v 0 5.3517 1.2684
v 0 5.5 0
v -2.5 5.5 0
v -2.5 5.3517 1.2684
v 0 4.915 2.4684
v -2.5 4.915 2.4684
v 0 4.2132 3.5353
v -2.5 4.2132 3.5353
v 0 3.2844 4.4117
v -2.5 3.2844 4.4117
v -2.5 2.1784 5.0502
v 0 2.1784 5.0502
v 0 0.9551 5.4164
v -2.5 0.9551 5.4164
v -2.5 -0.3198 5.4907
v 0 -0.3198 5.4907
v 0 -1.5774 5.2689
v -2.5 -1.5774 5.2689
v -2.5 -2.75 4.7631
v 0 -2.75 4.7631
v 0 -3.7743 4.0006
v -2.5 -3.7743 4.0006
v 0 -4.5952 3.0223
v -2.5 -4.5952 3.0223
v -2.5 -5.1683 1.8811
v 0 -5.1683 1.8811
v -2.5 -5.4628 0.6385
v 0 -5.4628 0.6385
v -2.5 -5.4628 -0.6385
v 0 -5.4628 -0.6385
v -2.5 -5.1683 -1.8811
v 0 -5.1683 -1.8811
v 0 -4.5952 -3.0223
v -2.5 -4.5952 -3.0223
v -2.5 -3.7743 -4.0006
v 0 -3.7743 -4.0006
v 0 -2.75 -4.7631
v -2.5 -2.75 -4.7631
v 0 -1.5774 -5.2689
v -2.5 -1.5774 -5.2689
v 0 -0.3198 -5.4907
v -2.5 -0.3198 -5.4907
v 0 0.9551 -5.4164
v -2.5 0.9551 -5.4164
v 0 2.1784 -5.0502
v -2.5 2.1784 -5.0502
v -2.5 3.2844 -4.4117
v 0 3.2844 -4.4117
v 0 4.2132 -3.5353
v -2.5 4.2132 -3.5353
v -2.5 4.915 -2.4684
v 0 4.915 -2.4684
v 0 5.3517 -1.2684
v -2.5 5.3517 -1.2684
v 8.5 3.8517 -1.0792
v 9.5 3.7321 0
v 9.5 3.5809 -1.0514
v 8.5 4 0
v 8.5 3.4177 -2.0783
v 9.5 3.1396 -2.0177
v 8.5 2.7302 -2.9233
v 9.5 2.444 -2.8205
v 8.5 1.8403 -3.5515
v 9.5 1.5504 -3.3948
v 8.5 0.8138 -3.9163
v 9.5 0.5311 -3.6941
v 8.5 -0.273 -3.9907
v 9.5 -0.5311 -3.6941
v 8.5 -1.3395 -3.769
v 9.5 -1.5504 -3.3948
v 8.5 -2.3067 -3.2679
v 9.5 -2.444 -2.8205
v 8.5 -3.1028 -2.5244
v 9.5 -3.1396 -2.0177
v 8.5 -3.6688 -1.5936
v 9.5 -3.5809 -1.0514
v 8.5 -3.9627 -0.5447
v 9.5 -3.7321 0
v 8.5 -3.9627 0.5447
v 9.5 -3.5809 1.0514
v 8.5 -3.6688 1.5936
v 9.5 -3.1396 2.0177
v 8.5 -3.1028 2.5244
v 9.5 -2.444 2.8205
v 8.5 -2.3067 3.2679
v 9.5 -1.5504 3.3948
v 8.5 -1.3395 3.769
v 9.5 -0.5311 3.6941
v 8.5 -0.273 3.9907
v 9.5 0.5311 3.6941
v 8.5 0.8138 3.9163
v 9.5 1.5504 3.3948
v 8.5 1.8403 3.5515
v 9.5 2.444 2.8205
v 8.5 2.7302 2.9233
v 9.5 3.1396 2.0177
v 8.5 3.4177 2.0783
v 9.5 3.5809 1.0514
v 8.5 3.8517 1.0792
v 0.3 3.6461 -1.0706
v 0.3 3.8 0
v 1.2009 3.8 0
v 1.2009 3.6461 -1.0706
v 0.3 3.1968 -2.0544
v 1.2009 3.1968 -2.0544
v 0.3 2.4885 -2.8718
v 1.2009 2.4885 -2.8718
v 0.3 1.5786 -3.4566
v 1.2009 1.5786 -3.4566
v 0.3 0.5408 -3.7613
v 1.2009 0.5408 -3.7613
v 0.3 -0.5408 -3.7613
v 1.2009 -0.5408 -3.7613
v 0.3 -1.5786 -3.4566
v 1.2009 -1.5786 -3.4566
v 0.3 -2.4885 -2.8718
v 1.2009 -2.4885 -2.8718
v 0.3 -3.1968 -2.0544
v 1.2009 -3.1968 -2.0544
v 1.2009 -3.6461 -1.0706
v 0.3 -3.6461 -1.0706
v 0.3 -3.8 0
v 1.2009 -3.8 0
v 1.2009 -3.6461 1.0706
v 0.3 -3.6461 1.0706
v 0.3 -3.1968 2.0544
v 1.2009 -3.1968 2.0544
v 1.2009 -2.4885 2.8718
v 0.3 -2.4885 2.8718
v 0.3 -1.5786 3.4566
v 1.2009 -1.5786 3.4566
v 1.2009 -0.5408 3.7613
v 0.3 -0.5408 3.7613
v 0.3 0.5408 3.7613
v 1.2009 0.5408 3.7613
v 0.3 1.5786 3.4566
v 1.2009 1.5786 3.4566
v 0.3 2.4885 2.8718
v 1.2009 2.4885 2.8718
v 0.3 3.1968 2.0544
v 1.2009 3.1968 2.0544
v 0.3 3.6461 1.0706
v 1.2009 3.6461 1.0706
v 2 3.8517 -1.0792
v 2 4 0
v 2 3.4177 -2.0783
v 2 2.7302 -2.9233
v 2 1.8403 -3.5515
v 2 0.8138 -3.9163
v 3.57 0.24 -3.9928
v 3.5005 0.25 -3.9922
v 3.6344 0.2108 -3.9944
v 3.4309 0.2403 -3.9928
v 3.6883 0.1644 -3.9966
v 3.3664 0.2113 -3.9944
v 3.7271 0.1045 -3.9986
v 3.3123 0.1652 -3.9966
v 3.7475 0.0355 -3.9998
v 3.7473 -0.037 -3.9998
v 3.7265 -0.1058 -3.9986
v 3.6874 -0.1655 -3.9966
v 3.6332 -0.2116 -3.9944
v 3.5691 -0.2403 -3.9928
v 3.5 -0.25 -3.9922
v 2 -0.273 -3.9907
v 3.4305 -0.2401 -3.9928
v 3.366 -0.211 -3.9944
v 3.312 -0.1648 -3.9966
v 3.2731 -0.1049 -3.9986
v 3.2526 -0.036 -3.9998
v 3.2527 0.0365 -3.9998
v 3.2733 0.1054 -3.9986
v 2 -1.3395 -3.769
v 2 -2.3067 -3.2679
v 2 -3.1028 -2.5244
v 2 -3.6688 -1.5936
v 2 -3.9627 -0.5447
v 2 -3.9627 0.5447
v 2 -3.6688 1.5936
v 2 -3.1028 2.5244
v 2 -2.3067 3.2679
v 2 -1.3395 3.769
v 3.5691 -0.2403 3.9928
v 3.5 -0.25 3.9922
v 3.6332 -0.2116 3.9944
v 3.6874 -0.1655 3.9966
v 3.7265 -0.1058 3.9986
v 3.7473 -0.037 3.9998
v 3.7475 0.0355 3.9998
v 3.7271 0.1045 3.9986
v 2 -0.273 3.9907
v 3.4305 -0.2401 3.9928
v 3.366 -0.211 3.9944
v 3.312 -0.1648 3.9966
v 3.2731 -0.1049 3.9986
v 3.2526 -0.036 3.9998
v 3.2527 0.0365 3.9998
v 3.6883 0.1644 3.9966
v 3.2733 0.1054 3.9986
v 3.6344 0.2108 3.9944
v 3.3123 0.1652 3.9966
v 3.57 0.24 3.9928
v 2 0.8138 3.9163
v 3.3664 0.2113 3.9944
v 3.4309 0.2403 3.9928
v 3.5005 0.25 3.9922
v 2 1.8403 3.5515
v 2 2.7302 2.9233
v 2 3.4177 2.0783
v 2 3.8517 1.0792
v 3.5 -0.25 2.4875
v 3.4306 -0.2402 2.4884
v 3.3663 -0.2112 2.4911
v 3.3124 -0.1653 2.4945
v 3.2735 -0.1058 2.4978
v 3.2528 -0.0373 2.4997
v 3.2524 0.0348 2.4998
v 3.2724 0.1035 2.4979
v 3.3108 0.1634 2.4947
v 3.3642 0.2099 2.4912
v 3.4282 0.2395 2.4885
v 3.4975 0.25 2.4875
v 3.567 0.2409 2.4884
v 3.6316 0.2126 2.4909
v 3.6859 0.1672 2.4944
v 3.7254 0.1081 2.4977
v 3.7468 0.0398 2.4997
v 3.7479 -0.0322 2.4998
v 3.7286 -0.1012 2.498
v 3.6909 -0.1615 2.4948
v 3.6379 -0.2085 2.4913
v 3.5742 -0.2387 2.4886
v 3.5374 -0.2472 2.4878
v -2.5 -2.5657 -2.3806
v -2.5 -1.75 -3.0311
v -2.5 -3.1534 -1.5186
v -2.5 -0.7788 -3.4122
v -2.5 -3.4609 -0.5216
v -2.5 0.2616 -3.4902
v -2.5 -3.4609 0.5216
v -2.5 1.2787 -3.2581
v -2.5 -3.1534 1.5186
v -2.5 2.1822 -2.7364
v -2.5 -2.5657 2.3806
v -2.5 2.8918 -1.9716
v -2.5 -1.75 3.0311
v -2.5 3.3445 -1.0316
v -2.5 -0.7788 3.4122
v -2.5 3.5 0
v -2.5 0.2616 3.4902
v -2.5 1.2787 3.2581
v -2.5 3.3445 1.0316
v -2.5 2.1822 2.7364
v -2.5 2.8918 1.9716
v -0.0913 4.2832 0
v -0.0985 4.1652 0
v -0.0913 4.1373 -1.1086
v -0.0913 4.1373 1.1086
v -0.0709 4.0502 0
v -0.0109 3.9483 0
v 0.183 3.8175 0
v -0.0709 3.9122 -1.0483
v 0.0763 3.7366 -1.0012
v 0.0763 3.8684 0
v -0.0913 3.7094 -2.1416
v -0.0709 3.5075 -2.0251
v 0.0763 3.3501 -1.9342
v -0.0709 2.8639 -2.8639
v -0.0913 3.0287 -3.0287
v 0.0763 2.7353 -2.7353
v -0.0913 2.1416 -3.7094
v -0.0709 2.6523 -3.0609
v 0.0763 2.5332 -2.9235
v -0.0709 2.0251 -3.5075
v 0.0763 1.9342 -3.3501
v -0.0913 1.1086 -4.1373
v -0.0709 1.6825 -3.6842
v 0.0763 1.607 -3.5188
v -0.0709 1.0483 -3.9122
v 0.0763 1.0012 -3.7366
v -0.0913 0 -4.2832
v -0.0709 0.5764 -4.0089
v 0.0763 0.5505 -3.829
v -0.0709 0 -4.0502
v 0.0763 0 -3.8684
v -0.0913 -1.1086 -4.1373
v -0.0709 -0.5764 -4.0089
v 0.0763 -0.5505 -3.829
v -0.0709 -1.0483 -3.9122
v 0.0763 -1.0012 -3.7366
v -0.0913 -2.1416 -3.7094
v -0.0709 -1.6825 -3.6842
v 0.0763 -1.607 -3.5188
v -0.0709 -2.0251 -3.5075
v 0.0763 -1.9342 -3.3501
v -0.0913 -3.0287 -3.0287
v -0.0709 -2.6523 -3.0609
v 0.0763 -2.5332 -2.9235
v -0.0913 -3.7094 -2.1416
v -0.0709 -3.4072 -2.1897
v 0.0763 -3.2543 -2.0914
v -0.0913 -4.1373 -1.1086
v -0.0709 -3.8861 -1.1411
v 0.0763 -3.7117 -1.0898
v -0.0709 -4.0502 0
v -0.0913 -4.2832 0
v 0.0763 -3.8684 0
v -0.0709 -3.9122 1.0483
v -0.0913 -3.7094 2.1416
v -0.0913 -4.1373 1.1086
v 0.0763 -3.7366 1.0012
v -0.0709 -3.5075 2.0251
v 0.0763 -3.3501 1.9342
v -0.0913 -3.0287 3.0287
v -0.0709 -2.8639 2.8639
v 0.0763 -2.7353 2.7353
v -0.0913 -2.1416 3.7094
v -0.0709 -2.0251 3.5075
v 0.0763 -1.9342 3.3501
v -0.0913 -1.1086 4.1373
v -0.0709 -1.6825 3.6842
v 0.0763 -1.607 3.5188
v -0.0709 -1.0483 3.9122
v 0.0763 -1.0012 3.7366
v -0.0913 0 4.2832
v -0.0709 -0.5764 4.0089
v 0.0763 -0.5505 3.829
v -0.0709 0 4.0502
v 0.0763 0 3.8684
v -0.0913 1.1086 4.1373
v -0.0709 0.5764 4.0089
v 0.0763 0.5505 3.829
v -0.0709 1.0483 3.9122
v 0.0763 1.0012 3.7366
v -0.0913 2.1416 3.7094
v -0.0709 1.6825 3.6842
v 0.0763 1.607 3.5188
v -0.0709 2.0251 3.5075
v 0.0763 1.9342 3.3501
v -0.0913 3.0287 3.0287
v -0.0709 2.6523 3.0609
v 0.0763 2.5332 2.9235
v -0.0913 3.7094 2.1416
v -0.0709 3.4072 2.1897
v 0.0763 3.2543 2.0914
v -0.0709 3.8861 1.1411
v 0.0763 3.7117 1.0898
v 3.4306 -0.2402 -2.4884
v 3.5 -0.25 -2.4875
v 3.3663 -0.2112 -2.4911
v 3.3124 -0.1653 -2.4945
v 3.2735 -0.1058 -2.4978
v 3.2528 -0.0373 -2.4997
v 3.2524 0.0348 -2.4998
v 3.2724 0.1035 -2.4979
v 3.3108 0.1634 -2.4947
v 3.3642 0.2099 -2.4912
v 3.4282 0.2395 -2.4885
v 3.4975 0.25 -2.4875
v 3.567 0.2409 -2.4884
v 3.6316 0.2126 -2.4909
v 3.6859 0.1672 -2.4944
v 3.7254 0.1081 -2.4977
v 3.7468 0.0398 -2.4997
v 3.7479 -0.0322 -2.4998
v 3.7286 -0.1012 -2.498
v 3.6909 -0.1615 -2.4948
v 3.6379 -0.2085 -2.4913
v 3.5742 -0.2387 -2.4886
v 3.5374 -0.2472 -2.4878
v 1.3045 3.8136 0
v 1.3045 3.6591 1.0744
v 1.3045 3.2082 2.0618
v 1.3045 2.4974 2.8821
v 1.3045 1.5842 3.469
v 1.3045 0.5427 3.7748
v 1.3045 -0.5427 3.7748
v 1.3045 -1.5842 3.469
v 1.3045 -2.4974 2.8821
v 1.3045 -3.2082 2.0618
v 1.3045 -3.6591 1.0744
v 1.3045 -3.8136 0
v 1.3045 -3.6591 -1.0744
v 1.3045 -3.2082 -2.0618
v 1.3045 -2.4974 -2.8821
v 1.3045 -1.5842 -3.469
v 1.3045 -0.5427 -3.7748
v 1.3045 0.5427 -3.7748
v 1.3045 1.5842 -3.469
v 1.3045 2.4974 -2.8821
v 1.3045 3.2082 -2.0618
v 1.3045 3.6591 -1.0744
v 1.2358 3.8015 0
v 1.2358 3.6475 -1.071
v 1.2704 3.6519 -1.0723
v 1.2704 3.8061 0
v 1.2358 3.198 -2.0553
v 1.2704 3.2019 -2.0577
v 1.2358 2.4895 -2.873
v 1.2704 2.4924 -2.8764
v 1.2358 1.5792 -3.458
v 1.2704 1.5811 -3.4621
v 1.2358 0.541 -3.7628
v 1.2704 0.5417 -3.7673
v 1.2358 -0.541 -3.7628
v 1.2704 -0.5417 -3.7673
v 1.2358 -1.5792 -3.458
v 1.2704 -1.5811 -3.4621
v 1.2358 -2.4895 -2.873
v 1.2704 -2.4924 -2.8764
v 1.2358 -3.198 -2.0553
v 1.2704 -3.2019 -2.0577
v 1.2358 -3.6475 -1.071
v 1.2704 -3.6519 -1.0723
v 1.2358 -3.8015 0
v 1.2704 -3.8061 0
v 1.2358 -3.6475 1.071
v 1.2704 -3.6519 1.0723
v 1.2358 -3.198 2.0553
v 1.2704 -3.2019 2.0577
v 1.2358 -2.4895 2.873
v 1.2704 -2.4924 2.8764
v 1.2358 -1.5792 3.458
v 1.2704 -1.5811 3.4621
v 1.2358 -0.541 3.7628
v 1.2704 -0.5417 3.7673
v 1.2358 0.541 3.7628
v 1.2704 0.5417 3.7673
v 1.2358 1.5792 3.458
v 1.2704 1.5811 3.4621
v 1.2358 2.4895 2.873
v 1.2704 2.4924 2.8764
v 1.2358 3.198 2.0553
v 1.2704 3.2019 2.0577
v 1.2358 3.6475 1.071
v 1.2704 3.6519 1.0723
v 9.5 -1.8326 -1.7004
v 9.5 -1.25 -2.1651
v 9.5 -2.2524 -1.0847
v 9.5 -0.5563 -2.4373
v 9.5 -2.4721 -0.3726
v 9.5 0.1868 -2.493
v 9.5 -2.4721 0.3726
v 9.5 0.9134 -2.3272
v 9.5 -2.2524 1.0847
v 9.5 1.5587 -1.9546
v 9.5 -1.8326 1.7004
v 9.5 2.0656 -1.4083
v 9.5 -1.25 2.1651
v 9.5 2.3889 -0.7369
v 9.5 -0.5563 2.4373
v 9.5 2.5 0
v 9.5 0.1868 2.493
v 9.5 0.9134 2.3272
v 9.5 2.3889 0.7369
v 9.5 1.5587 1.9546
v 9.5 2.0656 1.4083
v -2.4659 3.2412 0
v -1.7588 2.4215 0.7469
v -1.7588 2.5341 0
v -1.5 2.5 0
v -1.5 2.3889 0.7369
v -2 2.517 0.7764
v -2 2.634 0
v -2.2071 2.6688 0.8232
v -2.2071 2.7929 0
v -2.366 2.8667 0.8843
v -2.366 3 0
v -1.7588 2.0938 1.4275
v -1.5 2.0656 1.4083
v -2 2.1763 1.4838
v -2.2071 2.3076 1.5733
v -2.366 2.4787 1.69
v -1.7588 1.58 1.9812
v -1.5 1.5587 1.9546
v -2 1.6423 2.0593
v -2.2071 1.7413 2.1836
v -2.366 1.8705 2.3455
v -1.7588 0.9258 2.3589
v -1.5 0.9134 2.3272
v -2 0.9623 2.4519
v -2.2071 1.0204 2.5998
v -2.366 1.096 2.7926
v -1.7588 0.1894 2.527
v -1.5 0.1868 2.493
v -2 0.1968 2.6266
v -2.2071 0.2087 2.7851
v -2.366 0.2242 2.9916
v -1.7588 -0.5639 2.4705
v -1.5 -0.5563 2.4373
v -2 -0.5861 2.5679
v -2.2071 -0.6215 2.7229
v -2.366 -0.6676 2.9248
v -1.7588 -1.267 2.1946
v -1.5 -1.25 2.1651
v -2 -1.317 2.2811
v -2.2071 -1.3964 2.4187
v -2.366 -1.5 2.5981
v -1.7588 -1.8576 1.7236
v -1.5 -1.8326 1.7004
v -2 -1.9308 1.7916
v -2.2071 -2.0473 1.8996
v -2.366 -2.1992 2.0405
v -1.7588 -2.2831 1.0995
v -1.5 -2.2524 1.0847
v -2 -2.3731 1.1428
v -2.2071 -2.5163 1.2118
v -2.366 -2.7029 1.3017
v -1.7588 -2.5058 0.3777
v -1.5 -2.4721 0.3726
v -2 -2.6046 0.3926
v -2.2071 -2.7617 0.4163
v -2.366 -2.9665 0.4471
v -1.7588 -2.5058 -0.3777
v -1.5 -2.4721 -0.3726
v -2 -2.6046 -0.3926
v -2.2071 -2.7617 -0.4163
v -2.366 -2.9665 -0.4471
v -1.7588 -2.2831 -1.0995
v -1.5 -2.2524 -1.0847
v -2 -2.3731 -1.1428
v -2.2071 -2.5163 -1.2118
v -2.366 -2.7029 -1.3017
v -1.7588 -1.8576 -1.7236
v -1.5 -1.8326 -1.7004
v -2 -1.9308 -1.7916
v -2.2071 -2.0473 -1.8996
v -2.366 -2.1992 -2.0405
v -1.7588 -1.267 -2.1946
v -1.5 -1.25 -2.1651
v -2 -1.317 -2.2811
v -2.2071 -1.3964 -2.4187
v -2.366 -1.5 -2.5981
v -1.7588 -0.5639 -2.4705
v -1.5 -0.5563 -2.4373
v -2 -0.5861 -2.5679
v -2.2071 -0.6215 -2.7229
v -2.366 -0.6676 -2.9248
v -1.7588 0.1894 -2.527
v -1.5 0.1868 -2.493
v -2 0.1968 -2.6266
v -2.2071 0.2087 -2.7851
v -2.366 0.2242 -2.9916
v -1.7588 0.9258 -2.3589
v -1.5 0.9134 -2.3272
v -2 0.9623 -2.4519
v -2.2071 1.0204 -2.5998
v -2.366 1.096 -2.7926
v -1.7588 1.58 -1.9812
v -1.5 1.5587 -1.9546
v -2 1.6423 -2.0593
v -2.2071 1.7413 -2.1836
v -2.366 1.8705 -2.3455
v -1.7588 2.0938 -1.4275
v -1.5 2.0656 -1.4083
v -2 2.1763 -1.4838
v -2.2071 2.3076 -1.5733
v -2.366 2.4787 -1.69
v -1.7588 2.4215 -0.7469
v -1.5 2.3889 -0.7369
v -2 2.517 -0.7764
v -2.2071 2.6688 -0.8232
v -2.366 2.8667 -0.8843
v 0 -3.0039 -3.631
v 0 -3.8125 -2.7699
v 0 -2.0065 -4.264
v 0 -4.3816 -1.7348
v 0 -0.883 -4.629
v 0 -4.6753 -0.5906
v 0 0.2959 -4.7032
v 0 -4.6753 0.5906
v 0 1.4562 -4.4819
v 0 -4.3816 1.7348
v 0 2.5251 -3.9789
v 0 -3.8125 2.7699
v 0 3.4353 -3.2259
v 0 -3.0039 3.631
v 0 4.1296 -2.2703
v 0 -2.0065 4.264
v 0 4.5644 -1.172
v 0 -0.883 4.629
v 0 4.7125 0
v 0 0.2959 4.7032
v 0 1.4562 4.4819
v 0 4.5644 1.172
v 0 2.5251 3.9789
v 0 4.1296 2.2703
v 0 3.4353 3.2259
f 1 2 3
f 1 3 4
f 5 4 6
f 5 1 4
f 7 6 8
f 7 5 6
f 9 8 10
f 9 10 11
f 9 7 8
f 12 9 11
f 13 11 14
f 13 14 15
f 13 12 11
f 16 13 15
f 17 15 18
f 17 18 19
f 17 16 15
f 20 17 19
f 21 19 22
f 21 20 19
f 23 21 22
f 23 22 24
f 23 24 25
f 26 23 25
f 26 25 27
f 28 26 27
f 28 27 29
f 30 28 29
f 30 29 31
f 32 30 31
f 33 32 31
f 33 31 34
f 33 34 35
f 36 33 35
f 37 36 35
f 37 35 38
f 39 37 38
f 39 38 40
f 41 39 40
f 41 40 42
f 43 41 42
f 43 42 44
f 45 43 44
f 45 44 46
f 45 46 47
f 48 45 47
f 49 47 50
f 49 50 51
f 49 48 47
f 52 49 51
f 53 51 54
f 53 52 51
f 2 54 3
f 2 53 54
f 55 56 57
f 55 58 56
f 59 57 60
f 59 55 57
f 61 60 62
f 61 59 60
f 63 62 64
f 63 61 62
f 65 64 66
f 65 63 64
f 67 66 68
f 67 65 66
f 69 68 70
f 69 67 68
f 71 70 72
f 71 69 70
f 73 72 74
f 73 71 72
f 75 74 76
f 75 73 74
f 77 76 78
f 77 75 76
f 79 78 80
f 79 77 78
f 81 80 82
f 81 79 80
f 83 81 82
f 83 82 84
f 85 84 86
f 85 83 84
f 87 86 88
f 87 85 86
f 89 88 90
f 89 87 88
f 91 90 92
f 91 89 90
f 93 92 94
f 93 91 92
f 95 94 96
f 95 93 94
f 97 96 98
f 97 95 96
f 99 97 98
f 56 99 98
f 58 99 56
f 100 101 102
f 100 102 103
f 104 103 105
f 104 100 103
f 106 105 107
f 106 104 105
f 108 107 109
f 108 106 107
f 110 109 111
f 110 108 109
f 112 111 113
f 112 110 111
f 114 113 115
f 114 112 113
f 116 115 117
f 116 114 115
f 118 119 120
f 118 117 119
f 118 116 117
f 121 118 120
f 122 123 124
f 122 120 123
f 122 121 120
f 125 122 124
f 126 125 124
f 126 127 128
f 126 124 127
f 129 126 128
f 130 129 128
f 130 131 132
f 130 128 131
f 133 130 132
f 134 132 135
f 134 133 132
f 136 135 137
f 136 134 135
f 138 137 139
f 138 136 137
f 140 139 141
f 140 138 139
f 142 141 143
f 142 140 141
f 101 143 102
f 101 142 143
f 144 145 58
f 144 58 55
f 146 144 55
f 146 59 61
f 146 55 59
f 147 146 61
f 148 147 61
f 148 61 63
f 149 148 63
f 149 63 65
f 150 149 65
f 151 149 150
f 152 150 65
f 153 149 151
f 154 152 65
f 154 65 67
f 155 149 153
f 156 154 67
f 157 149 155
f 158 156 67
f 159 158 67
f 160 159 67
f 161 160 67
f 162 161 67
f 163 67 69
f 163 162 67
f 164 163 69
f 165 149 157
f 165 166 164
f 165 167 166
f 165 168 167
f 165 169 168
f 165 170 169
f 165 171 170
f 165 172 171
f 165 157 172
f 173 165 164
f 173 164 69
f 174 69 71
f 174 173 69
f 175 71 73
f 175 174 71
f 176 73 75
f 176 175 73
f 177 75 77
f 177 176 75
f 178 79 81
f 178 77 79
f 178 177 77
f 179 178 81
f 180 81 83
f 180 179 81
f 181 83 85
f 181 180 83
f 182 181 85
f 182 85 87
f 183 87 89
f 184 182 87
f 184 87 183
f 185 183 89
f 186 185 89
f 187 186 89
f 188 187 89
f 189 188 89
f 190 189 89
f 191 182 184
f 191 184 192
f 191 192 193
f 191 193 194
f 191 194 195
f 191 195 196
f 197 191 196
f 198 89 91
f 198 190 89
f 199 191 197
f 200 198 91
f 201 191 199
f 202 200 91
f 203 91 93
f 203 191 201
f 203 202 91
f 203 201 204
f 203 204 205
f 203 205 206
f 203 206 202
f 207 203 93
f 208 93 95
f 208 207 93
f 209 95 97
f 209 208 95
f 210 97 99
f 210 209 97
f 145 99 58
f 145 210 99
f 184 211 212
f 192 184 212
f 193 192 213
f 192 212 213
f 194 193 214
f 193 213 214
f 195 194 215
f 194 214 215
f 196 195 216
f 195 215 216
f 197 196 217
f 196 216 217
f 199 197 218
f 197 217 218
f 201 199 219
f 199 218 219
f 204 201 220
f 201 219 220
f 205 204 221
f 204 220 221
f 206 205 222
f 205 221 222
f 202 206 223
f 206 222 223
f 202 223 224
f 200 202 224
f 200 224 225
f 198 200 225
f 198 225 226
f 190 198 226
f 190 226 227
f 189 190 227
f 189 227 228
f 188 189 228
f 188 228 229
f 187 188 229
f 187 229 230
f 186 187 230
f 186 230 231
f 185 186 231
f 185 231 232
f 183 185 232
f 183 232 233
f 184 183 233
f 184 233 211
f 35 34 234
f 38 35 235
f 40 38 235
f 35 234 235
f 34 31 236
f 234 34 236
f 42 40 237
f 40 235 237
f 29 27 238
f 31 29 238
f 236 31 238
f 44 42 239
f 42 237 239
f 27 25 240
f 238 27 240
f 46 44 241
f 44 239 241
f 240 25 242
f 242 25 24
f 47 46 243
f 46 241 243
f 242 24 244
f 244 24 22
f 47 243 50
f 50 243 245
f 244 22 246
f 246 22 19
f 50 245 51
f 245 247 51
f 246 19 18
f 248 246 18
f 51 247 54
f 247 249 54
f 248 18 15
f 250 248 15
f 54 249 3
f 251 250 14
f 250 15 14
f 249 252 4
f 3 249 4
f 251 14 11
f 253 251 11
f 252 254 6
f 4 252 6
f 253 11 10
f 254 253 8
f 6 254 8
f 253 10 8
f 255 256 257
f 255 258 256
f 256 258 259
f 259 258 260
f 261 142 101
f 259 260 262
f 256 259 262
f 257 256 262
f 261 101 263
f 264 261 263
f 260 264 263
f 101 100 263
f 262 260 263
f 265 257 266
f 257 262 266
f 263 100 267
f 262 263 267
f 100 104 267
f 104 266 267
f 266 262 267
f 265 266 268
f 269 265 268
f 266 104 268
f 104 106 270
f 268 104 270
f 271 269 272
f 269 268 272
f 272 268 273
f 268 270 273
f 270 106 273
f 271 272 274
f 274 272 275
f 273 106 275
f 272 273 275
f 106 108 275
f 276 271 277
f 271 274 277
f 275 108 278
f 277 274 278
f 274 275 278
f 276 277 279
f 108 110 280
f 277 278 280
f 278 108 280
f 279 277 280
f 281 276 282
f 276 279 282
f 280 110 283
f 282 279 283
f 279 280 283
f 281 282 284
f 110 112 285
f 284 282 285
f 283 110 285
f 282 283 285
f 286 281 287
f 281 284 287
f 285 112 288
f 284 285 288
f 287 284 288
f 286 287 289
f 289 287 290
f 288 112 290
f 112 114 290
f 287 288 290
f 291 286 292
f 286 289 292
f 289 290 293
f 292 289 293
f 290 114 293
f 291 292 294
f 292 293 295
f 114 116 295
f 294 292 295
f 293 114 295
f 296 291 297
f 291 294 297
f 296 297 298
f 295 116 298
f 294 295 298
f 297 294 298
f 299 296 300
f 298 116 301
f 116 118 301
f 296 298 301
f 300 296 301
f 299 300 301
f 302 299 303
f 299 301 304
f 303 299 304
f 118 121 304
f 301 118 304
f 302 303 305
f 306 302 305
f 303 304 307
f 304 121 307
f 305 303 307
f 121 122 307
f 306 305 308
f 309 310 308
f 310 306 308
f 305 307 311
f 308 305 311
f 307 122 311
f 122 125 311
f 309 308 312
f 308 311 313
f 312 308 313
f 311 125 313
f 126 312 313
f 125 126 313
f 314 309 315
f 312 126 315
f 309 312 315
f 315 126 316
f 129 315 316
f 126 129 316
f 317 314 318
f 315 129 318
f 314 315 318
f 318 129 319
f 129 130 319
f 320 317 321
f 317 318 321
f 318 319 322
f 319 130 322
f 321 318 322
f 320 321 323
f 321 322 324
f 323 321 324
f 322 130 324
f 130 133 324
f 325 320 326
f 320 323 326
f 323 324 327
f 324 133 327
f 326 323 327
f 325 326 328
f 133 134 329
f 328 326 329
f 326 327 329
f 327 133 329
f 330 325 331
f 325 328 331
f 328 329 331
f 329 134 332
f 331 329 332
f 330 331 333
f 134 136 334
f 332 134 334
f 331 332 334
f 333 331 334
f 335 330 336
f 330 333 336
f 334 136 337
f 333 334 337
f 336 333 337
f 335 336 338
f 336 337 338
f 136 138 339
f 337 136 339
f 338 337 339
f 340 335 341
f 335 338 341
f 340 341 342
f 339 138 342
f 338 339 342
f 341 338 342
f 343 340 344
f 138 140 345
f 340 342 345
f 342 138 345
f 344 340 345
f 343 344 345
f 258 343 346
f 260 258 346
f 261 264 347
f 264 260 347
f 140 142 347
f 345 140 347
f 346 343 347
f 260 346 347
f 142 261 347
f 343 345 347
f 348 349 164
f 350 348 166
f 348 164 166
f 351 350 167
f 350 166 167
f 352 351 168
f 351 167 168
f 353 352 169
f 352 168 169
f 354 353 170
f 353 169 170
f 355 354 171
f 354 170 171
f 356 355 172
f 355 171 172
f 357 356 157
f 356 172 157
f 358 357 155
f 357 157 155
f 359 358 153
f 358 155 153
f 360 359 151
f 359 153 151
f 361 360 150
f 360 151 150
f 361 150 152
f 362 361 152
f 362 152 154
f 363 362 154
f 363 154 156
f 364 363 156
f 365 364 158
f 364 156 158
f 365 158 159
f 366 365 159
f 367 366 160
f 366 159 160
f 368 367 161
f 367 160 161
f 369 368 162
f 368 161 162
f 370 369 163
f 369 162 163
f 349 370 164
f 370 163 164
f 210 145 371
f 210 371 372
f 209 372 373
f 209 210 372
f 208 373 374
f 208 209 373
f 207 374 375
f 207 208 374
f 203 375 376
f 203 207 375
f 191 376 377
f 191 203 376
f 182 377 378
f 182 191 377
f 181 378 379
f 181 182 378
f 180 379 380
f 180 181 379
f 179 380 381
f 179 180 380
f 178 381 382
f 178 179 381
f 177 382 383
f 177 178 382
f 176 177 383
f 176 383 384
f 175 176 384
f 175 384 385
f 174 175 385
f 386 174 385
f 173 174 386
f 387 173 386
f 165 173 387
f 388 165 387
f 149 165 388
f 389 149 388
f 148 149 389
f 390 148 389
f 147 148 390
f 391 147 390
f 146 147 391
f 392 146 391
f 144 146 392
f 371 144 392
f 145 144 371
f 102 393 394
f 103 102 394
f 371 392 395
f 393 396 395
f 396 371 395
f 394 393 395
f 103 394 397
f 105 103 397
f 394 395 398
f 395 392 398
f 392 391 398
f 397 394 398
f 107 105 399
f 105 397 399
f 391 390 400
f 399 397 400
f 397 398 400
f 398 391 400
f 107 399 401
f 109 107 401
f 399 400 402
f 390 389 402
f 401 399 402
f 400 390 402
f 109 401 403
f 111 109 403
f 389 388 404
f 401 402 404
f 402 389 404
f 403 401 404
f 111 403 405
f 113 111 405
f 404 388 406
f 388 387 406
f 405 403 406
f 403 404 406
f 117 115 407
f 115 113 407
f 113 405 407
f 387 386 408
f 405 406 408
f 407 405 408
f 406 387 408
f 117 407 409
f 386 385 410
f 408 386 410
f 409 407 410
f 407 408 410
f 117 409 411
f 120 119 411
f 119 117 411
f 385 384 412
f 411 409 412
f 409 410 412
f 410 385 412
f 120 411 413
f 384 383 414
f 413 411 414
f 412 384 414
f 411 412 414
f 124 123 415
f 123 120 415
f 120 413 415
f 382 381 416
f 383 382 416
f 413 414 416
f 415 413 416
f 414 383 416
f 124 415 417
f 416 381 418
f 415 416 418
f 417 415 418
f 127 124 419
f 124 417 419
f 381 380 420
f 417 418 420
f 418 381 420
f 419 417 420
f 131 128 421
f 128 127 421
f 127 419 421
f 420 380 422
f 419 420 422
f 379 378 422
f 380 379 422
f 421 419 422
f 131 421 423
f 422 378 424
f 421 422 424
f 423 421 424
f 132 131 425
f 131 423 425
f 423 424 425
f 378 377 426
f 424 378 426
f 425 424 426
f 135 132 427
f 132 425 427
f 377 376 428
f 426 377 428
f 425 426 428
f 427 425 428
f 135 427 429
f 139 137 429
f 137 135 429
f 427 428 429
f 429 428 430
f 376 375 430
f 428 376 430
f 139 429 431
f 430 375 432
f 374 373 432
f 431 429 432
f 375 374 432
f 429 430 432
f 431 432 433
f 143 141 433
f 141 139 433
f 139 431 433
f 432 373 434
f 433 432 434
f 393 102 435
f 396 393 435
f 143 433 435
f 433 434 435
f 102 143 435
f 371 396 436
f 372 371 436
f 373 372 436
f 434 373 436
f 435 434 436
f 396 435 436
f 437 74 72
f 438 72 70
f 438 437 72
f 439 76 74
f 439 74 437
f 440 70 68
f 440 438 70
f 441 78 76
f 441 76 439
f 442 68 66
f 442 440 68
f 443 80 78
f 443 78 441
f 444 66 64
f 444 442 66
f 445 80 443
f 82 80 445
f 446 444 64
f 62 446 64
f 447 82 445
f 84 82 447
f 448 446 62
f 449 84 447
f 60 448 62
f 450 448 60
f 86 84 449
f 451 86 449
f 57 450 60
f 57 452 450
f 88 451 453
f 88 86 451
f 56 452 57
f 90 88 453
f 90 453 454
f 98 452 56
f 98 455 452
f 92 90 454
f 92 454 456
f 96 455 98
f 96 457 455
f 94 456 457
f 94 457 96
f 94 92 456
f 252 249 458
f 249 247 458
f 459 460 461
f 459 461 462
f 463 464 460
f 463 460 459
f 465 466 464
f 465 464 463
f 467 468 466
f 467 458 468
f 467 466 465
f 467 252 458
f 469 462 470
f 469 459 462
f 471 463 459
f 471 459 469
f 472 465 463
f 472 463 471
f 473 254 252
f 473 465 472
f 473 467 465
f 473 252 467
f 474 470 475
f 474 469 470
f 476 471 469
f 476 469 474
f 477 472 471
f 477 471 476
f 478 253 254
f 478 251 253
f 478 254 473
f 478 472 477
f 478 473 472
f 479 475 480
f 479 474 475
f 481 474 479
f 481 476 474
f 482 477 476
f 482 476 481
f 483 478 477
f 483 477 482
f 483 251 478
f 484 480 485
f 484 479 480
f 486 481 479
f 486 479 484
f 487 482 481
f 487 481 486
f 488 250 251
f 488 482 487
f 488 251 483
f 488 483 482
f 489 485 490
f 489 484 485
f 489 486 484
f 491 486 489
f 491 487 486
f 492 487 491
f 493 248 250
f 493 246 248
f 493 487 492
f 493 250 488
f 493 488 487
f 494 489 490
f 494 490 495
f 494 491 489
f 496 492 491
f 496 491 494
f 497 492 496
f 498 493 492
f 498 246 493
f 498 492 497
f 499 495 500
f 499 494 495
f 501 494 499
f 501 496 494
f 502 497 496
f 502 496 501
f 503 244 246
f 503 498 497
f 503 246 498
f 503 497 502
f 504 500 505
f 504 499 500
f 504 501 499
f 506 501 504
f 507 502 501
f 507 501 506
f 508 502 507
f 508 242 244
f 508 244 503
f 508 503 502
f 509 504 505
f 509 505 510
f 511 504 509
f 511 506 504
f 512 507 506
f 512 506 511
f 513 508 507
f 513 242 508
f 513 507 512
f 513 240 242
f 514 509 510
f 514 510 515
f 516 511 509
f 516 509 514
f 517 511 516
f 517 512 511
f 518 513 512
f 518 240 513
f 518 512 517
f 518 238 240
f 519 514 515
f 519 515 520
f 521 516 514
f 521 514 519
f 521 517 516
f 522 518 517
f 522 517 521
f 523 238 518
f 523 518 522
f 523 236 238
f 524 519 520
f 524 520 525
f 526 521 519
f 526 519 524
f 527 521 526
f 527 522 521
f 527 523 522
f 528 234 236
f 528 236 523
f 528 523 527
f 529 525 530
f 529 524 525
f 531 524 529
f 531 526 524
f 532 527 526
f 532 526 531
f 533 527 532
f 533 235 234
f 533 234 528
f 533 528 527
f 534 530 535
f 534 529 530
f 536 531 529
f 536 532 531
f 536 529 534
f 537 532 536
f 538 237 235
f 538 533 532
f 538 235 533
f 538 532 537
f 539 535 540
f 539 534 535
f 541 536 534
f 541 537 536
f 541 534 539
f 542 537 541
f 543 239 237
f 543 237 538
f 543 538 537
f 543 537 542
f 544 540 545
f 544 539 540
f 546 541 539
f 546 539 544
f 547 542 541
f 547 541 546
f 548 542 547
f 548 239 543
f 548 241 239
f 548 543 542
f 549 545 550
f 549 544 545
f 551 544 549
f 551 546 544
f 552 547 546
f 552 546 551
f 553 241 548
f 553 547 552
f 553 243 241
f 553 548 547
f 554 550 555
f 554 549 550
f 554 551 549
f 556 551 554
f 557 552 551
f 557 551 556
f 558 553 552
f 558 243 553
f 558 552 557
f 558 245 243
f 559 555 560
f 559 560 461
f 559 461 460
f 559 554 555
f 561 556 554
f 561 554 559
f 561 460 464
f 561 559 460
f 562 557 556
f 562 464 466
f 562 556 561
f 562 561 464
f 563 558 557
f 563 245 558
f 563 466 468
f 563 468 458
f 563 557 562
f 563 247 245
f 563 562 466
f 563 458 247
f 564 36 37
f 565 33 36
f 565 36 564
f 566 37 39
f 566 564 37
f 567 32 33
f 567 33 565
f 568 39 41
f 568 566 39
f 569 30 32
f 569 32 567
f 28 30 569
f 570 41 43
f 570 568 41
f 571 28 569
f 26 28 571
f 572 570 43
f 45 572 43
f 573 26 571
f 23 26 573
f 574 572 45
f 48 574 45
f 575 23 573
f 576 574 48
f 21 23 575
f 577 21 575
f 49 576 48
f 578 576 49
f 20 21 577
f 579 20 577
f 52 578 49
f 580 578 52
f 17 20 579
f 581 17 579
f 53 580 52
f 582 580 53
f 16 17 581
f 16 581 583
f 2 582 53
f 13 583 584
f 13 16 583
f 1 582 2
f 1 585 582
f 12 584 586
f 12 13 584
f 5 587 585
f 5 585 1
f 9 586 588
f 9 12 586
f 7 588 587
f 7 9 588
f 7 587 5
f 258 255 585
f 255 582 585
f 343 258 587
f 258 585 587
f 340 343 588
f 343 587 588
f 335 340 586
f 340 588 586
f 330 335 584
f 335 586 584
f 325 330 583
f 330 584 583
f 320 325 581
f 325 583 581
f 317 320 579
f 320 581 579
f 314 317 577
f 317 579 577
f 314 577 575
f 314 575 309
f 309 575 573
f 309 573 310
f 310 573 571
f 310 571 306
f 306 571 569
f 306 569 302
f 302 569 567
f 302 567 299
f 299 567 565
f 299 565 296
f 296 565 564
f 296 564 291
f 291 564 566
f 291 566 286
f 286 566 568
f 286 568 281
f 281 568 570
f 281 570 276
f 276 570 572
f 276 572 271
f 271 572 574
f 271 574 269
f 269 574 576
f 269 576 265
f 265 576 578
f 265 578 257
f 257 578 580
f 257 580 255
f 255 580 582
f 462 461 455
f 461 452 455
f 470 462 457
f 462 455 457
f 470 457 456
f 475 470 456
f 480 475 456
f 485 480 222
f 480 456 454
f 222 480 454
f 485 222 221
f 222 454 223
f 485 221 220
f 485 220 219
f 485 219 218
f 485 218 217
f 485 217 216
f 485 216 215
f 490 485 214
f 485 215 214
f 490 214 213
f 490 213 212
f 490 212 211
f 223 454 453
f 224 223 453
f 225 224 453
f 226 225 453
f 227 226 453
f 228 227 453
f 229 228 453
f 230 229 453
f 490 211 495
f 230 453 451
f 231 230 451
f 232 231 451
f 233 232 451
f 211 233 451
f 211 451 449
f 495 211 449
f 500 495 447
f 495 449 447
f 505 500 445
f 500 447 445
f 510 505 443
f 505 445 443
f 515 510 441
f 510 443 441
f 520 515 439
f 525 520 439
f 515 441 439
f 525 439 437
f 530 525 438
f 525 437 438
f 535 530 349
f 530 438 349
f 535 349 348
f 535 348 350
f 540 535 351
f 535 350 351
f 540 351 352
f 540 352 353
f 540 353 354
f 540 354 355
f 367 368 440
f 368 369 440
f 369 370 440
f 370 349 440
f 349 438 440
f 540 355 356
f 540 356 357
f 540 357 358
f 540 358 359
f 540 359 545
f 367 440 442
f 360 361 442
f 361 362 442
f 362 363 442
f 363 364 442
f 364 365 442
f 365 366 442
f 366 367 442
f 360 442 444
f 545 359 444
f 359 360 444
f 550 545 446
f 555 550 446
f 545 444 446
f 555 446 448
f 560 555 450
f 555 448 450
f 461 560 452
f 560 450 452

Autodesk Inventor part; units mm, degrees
ref_plane "YZ Plane" through (0, 0, 0) normal (1, 0, 0) x (0, 1, 0)
ref_plane "XZ Plane" through (0, 0, 0) normal (0, 1, 0) x (-1, 0, 0)
sketch "Skizze1" plane through (0, 0, 0) normal (0, 0, 1) x (1, 0, 0)
  line L0 (-2.5, 0) -> (5.5, 0)
  line L1 (9.5, 2.5) -> (9.5, 4)
  line L2 (9.5, 4) -> (2, 4)
  line L3 (-2.5, 2.5) -> (-2.5, 5.5)
  line L4 (-2.5, 5.5) -> (0, 5.5)
  line L5 (2, 4) -> (1.3045, 3.8136)
  line L6 (1.2009, 3.8) -> (0.3, 3.8)
  line L7 (-0.0913, 4.2832) -> (0, 4.7125)
  line L8 (0, 4.7125) -> (0, 5.5)
  arc A0 (-0.0913, 4.2832) -> (0.3, 3.8) centre (0.3, 4.2) ccw
  arc A1 (1.2009, 3.8) -> (1.3045, 3.8136) centre (1.2009, 4.2) ccw
  line L9 (-4.9, 0) -> (11.9, 0) projected
  line L10 (0, -0.9) -> (0, 5.4) projected
  line L11 (-2.5, 2.5) -> (9.5, 2.5)
  dimension "d0" = 11
  dimension "d1" = 8
  dimension "d2" = 12
  dimension "d3" = 12
  dimension "d4" = 0.4
  dimension "d5" = 0.1
  dimension "d6" = 2
  dimension "d7" = 15
  dimension "d8" = 0.2
  dimension "d9" = 0.4
  dimension "d10" = 2.5
  dimension "d11" = 5
revolve "Körper" add sketch "Skizze1" angle 360 about axis through (-2.5, 0, 0) along (1, 0, 0) contours L11 L10 A0 L6 A1 L5 L2 L1 | L11 L3 L4 L8 L7 A0 L10
chamfer "Fase1" distance 1 angle 15 1 edges at (9.5, -4, 0) measured on face at (7, 3.9482, -0.6416)
fillet "Rundung1" radius 1 1 edges at (-2.5, -2.5, 0)
ref_plane "Arbeitsebene1" through (0, 0, 3) normal (0, 0, 1) x (1, 0, 0)
sketch "Skizze2" plane through (0, 0, 3) normal (0, 0, 1) x (1, 0, 0)
  line L0 (9.5, 3.7321) -> (9.5, -3.7321) projected
  line L1 (-2.5, -5.5) -> (-2.5, 5.5) projected
  point P0 (0, 0)
  point P1 (3.5, 0)
  point P2 (9.5, 0)
  dimension "d39" = 6
hole "Bohrung1" at (3.5, 0, 3) direction (0, 0, -1) diameter 0.5 end through all both
equation "\"d12\" = PHH"
equation "\"d13\" = ANG"
equation "\"d29\" = PHH"
equation "\"d14\" = RR"
equation "\"d0\" = KOD"
equation "\"d1\" = SD2"
equation "\"d2\" = NLG"
equation "\"d4\" = FSRR"
equation "\"d5\" = FST2"
equation "\"d6\" = FSB"
equation "\"d8\" = FST1"
equation "\"d9\" = FSRR"
equation "\"d10\" = KOH"
equation "\"d11\" = NND"
equation "\"NLG\" = 12"
equation "\"NND\" = 5"
equation "\"KOD\" = 11"
equation "\"KOH\" = 2.5"
equation "\"SD2\" = 8"
equation "\"FST1\" = 0.2"
equation "\"FST2\" = 0.1"
equation "\"FSB\" = 2"
equation "\"FSRR\" = 0.4"
equation "\"PHH\" = 1"
equation "\"ANG\" = 15deg"
equation "\"RR\" = 1"
equation "\"NNDMIN\" = 4.1"
equation "\"FSH\" = 1.1"
equation "\"NNDMAX\" = 5"
equation "\"SEWI\" = 30deg"
properties part number "DIN 172 - A 5 x 12" material "Stahl, weich"
